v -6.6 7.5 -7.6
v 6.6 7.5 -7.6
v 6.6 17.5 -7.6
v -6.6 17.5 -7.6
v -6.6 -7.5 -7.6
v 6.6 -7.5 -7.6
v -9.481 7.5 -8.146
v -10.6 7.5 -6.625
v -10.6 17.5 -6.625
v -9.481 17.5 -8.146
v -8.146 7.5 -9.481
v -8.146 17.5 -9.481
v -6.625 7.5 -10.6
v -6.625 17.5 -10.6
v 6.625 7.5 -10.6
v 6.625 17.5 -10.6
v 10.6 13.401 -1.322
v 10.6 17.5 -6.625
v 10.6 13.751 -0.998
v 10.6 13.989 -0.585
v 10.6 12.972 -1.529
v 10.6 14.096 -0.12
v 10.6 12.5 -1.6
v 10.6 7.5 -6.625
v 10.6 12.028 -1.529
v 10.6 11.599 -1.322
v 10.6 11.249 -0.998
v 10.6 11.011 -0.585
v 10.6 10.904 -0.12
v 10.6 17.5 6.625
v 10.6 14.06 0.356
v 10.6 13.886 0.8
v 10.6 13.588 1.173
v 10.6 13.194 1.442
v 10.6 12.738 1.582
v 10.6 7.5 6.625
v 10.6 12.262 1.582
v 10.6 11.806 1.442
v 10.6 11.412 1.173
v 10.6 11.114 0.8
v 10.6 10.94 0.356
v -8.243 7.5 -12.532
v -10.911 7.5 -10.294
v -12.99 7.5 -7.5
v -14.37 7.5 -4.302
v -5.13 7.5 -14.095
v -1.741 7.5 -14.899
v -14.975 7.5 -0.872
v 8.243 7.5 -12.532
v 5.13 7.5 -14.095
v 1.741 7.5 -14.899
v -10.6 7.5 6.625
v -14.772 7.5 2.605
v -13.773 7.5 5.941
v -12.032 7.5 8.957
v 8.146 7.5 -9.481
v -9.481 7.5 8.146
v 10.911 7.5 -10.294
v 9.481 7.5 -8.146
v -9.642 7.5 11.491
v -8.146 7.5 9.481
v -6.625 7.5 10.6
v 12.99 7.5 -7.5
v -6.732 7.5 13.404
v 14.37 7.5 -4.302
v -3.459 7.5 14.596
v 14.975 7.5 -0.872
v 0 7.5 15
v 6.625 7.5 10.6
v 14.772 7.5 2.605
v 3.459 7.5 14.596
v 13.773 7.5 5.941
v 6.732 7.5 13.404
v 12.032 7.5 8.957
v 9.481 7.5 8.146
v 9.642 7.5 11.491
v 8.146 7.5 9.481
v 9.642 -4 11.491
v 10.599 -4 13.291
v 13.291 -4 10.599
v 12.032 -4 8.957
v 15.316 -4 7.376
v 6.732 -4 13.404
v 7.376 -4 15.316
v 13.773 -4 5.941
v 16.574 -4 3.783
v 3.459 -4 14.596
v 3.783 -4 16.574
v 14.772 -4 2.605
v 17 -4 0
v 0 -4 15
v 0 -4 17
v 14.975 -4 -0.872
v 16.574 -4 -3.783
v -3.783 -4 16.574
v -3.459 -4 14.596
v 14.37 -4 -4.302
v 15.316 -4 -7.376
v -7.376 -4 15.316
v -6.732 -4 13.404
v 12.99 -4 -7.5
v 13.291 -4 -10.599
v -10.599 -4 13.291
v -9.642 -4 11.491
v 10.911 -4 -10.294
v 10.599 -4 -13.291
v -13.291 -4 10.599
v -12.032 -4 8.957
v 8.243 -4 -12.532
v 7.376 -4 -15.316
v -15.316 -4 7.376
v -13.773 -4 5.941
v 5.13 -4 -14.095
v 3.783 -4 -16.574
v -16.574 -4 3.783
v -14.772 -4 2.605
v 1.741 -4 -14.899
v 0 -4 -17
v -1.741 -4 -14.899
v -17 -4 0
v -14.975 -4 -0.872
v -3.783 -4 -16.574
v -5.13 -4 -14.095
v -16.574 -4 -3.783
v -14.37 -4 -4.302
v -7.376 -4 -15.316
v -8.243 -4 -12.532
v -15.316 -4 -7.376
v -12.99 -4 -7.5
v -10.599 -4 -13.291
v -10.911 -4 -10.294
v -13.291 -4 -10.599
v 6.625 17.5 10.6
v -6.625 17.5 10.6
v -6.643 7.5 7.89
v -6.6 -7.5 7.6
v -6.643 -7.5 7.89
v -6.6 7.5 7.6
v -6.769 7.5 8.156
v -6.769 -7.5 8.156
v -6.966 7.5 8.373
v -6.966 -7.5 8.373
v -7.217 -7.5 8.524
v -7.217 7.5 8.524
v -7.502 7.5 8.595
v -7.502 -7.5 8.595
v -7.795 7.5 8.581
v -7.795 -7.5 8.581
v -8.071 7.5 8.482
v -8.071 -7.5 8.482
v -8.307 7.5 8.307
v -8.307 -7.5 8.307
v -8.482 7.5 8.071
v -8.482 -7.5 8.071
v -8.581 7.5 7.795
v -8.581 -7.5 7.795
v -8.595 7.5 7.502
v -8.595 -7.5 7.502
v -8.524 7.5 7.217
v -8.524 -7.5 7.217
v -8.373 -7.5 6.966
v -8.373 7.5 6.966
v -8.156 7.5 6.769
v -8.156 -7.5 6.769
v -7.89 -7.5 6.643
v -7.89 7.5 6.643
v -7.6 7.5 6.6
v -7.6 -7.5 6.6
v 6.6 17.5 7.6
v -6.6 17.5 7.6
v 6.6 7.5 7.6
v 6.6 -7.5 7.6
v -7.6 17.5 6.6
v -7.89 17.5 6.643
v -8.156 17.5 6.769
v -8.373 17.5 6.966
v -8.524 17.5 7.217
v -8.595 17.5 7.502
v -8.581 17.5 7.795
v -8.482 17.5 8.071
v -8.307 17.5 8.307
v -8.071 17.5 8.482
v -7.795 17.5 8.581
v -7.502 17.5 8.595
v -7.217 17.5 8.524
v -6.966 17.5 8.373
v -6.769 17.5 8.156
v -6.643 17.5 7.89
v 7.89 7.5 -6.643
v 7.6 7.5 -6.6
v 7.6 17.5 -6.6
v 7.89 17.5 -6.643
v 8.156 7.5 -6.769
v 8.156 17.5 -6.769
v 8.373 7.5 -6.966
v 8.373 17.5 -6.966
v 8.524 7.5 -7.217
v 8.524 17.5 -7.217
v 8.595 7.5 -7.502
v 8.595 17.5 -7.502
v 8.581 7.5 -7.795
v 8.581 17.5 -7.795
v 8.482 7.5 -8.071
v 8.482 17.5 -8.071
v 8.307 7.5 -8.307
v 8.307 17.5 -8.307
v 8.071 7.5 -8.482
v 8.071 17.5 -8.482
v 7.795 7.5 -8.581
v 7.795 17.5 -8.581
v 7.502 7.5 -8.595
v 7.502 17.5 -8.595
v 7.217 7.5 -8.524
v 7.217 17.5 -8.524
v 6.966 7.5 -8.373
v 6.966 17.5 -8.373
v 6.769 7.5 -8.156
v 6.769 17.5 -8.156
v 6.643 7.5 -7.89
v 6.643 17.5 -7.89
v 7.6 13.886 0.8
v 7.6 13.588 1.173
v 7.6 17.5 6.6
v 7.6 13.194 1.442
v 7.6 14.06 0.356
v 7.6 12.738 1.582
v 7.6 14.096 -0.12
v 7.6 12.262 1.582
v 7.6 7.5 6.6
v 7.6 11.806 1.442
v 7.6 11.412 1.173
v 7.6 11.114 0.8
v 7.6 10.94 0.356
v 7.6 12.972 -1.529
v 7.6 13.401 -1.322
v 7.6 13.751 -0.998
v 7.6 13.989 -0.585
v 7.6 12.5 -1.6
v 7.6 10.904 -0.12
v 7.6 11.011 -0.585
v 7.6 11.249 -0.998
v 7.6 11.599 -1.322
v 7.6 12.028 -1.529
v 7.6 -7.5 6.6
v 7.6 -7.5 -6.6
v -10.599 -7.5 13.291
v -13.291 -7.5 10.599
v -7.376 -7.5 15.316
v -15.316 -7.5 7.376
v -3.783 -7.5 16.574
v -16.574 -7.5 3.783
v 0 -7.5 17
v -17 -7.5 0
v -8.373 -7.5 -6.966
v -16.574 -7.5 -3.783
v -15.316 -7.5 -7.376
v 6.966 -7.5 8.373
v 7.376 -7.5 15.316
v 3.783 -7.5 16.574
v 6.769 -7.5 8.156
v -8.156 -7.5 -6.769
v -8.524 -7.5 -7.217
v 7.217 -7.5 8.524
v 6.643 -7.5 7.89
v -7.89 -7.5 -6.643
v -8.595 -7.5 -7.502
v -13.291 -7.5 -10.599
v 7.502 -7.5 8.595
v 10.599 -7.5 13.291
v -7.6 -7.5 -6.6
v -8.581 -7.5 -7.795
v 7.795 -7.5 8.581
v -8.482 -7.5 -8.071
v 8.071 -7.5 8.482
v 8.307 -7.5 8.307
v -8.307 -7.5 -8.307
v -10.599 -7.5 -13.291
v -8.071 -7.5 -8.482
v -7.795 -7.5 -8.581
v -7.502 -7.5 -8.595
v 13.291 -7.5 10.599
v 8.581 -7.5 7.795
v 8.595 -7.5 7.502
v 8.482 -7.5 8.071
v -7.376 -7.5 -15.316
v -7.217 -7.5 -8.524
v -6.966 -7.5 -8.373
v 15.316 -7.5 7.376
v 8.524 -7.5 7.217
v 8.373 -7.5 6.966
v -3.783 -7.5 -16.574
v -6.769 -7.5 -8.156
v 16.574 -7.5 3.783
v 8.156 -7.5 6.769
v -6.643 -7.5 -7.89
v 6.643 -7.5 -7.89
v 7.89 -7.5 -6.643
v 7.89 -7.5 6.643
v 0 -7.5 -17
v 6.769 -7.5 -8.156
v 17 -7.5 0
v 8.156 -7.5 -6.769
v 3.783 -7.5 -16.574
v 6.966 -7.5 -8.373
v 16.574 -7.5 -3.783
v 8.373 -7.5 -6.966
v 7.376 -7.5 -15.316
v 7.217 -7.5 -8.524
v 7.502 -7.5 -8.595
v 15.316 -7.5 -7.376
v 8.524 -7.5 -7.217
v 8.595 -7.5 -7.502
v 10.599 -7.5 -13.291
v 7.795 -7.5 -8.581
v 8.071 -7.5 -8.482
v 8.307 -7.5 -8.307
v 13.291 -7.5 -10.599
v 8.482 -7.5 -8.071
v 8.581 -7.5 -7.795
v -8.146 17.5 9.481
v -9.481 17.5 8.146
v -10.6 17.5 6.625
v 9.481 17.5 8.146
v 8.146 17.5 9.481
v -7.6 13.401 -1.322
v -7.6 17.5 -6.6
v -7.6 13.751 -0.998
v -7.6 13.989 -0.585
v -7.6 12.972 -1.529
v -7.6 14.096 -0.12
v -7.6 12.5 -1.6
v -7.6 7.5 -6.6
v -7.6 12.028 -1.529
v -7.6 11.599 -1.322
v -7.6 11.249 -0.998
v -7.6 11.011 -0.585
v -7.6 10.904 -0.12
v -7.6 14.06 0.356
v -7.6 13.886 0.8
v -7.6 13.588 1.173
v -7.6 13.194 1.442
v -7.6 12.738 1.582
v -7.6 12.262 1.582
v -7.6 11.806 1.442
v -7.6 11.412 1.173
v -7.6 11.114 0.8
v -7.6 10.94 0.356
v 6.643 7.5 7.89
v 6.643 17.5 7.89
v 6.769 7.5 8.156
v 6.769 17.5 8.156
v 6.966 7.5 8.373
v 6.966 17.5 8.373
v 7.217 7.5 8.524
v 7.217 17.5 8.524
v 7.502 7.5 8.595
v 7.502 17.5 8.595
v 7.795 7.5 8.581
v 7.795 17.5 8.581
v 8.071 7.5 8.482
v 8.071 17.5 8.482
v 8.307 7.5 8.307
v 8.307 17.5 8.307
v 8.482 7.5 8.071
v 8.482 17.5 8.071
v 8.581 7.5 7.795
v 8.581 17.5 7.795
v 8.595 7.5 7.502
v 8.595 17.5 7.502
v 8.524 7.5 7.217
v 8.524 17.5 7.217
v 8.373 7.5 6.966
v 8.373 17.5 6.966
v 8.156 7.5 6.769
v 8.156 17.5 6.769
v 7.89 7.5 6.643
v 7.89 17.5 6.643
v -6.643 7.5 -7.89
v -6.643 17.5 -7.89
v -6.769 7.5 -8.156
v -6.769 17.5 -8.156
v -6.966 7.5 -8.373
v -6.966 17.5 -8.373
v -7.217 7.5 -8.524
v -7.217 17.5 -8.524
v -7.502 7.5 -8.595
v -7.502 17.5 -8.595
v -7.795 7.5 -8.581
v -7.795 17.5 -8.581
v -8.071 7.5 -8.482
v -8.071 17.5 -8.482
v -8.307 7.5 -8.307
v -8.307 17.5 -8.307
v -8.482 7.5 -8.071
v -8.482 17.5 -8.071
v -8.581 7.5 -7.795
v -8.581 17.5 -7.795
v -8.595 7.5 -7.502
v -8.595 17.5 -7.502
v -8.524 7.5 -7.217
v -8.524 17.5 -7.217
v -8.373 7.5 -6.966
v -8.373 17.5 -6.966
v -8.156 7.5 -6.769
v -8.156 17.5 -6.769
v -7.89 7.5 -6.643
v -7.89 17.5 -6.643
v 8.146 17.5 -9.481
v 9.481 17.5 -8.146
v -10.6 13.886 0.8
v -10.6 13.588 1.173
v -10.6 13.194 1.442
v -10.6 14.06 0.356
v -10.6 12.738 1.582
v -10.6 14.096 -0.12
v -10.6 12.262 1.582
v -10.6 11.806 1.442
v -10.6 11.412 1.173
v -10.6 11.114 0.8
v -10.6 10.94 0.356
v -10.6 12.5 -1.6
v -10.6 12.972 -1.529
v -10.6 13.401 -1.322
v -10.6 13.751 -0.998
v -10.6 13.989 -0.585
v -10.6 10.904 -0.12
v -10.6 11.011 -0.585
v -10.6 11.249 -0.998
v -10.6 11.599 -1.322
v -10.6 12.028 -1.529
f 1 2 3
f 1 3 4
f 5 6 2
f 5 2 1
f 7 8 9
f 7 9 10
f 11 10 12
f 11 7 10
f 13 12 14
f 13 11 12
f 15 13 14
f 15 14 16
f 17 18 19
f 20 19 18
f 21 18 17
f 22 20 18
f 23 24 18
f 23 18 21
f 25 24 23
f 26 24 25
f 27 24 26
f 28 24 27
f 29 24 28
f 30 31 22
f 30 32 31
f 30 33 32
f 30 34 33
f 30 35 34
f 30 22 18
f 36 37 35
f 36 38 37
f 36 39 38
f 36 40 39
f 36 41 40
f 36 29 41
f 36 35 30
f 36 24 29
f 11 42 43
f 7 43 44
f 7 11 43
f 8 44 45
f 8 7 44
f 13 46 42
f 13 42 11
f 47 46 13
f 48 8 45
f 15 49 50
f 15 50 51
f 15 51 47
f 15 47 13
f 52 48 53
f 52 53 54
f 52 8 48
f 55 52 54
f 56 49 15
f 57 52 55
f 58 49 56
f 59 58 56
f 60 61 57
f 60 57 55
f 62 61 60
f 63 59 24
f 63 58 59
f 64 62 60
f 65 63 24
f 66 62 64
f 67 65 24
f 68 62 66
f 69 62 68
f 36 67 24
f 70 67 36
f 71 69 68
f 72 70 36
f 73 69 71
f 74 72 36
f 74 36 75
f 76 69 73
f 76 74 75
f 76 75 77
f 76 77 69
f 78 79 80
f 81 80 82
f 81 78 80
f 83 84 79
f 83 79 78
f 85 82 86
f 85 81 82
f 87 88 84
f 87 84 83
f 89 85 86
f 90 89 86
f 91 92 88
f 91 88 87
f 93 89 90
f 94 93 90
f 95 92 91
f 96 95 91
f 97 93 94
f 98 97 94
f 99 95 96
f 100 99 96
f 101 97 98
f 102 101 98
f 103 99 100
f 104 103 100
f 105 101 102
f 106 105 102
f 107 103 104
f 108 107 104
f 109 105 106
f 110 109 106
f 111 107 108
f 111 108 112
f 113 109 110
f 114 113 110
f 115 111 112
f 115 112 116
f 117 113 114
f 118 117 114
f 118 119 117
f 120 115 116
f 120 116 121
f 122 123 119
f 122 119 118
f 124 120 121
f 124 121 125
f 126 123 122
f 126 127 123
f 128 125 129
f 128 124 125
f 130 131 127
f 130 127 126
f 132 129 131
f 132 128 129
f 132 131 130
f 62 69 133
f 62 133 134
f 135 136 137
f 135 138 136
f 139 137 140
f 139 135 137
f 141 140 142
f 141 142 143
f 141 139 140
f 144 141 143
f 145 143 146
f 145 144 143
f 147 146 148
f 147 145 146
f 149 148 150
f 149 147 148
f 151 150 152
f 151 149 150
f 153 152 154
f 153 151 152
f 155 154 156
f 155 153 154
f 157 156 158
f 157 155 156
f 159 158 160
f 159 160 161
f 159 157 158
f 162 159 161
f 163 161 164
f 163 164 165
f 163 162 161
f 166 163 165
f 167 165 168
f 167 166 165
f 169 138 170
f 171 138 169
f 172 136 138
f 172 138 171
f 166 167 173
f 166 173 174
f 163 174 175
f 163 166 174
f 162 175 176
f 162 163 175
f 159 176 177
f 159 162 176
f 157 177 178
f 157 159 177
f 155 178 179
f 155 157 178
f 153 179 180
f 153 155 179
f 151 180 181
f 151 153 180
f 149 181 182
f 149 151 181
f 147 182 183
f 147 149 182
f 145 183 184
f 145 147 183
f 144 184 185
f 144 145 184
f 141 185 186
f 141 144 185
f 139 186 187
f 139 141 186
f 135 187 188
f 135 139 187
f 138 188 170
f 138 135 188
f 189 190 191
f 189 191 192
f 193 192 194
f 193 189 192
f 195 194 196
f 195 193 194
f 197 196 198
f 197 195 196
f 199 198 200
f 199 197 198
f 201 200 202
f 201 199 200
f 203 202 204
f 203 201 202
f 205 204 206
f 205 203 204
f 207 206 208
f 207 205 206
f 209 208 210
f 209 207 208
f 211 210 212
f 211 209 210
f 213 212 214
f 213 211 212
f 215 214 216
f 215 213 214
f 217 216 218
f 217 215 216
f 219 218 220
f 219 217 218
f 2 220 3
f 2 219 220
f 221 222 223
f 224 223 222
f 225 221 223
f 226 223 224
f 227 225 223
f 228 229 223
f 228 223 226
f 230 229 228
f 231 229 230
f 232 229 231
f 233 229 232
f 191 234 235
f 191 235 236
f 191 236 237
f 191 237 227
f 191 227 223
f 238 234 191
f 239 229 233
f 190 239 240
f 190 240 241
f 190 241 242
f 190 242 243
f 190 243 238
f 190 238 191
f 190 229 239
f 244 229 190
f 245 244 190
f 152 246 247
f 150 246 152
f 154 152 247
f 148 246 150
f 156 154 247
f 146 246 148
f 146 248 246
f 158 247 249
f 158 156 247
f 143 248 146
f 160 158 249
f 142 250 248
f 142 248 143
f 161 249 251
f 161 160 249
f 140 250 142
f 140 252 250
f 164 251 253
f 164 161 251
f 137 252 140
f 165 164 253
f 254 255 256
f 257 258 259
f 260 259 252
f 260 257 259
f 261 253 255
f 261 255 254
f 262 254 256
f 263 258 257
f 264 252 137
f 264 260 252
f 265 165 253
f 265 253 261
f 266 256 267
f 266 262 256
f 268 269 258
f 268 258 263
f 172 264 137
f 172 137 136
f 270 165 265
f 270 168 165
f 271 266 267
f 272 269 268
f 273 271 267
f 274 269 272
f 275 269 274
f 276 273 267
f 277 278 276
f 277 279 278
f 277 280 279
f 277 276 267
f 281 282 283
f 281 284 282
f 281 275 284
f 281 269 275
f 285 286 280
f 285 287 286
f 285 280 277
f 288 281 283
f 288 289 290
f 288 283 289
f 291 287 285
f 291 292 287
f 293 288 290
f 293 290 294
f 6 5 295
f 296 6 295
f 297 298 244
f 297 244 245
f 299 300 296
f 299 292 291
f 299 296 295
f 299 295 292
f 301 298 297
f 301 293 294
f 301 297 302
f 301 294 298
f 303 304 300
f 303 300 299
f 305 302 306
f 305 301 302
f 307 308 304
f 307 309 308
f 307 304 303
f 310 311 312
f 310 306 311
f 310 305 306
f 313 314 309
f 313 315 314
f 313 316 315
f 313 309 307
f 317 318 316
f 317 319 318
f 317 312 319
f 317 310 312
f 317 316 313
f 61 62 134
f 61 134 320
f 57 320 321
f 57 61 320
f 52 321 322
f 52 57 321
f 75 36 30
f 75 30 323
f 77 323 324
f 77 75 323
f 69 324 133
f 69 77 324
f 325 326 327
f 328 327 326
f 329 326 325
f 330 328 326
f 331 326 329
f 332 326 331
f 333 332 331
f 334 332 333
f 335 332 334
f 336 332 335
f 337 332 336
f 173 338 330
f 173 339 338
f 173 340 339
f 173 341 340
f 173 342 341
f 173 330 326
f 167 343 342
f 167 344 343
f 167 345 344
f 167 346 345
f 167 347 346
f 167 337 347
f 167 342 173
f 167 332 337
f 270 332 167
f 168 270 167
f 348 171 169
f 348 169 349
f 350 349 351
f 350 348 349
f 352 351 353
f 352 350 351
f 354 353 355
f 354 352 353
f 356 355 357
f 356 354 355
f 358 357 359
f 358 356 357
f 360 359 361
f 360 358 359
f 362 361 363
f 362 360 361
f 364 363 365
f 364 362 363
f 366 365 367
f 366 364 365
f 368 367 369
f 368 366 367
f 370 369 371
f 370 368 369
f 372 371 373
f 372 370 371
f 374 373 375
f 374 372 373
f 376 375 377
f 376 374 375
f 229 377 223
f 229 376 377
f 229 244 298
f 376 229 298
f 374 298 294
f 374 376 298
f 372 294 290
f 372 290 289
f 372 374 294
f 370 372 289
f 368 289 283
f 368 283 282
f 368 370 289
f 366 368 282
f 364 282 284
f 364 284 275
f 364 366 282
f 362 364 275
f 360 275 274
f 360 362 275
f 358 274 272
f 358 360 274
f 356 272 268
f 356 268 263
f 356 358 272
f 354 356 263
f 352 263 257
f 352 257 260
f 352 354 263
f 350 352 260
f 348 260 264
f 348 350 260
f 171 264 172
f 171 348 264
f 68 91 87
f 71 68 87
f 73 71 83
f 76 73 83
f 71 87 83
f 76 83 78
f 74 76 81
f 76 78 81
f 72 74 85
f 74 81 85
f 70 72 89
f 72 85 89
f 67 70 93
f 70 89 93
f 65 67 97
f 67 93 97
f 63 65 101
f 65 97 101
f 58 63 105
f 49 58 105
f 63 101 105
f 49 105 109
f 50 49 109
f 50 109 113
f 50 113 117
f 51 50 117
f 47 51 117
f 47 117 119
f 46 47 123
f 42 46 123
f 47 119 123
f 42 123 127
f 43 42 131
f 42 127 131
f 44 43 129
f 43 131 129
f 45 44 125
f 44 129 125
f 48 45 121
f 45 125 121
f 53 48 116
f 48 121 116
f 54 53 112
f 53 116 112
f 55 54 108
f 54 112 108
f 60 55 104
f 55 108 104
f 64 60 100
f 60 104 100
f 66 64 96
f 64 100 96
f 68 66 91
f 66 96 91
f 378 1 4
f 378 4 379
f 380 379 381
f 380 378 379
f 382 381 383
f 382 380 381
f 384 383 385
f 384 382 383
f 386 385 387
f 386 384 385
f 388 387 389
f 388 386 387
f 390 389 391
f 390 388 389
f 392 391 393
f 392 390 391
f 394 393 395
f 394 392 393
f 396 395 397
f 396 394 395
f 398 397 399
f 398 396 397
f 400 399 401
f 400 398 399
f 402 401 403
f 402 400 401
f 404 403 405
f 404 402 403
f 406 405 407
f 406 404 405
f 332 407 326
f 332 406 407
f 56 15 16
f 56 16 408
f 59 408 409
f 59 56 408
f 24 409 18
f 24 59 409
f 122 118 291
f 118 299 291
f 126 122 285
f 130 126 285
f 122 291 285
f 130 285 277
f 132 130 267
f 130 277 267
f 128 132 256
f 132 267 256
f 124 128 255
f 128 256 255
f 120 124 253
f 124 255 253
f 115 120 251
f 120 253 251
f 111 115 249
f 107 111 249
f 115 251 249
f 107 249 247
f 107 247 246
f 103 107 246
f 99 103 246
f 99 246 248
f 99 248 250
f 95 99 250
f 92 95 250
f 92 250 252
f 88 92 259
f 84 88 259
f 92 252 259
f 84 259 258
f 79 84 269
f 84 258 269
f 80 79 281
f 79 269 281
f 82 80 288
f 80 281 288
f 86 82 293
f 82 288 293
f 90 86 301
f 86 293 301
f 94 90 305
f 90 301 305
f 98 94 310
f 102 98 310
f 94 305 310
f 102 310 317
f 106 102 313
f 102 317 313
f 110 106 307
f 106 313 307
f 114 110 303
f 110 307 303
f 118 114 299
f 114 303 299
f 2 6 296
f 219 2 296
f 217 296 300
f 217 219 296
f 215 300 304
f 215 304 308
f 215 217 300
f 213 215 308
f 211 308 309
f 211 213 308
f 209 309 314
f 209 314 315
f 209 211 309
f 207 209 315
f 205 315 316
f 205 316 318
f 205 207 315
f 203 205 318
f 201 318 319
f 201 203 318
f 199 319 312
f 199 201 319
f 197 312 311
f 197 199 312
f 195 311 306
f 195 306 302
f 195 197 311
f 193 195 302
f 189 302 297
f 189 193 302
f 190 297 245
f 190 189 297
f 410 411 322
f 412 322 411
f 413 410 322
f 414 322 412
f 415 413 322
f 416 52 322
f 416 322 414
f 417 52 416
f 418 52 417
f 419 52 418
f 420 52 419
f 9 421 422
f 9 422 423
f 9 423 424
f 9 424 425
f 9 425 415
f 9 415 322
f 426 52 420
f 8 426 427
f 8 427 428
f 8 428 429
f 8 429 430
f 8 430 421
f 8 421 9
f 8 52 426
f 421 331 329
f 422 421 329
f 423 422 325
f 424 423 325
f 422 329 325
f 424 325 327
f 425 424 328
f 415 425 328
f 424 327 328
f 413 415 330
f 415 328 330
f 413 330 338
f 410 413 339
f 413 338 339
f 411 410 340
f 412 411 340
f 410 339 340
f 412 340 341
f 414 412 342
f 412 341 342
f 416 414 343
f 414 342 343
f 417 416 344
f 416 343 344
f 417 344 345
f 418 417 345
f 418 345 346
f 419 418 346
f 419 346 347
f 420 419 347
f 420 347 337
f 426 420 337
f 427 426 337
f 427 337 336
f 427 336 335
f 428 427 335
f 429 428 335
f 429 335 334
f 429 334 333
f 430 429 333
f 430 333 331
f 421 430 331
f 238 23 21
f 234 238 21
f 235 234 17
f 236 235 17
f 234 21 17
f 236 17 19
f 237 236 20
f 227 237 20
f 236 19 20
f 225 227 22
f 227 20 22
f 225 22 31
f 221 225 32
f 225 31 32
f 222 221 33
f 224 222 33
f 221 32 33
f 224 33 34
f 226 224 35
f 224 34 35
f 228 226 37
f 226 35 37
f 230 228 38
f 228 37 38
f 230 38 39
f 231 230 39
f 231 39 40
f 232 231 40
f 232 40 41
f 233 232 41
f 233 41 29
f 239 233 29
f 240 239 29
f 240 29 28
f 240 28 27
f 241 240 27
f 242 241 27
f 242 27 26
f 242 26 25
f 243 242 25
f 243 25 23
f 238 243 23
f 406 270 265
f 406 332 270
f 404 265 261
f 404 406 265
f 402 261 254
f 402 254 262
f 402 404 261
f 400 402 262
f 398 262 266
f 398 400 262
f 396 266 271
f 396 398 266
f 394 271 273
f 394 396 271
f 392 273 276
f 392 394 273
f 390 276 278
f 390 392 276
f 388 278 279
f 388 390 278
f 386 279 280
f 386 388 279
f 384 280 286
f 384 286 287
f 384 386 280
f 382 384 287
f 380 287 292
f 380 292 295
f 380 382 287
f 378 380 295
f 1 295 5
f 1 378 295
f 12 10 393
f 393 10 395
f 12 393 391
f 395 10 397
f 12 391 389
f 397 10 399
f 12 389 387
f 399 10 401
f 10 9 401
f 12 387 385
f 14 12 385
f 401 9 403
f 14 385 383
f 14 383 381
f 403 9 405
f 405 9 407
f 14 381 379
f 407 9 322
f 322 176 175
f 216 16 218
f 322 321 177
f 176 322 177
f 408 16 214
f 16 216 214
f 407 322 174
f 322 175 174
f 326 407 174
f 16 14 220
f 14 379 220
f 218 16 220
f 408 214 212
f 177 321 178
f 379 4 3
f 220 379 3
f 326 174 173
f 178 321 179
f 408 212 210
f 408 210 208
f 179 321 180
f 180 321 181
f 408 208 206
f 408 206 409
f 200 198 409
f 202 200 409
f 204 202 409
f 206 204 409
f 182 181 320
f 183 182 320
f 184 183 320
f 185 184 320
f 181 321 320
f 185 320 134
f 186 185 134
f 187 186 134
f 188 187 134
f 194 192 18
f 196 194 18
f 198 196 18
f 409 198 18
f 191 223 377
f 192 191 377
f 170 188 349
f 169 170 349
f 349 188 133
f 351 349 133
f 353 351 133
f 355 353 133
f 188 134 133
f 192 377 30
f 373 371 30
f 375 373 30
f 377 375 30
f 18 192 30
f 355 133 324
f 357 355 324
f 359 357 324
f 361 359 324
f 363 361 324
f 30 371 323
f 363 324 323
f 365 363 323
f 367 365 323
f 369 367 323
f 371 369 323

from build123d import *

# Parameters (mm, degrees)
SKETCH_1_R          = 12.5
EXTRUDE_1_DEPTH     = 7.5
EXTRUDE_2_DEPTH     = 10
EXTRUDE_START       = -3
SKETCH_3_R          = 17
SKETCH_3_R_2        = 12.5
EXTRUDE_3_DEPTH     = 3
SKETCH_4_R          = 2.1000000000000005
CUT_EXTRUDE_1_DEPTH = 37.83761664386012
SKETCH_5_R          = 1.6000000000000003
CUT_EXTRUDE_2_DEPTH = 37.83761664386012
CUT_EXTRUDE_START   = -10
CUT_EXTRUDE_3_DEPTH = 10
SKETCH_7_R          = 17
SKETCH_7_R_2        = 12.500000000000004
EXTRUDE_4_DEPTH     = 0.5
SKETCH_8_R          = 15
SKETCH_8_R_2        = 12.499999999999996
EXTRUDE_5_DEPTH     = 11.5


# Read off the part's stored shape, not the designer's step: 凸台-拉伸2
with BuildPart() as part:
    # 草图1 → 凸台-拉伸1 (new, symmetric)
    with BuildSketch(Plane(origin=(0, 0, 0), x_dir=(1, 0, 0), z_dir=(0, 1, 0))):
        with Locations(Location((-1.39e-15, 1.39e-15, 0), (0, 0, 270))):
            Circle(SKETCH_1_R)
        with BuildLine():
            Line((6.600000000000003, -7.6000000000000005), (-6.599999999999996, -7.6000000000000005))
            ThreePointArc((-6.599999999999996, -7.6000000000000005), (-8.30710678118655, -8.307106781186542), (-7.599999999999978, -6.6000000000000005))
            Line((-7.599999999999996, -6.6000000000000005), (-7.599999999999996, 6.599999999999999))
            ThreePointArc((-7.599999999999978, 6.599999999999999), (-8.30710678118655, 8.30710678118654), (-6.599999999999996, 7.599999999999999))
            Line((-6.599999999999996, 7.599999999999999), (6.600000000000003, 7.599999999999999))
            ThreePointArc((6.600000000000002, 7.599999999999999), (7.600000000000003, 8.6), (8.600000000000005, 7.599999999999999))
            ThreePointArc((8.600000000000005, 7.599999999999999), (8.307106781186558, 6.892893218813457), (7.600000000000021, 6.599999999999998))
            Line((7.600000000000003, 6.599999999999999), (7.600000000000003, -6.6))
            ThreePointArc((7.600000000000021, -6.6), (8.307106781186558, -6.892893218813459), (8.600000000000003, -7.6000000000000005))
            ThreePointArc((8.600000000000003, -7.6000000000000005), (7.600000000000003, -8.600000000000001), (6.600000000000002, -7.6000000000000005))
        make_face(mode=Mode.SUBTRACT)
    extrude(amount=EXTRUDE_1_DEPTH, both=True)

    # 凸台-拉伸2 outline → 凸台-拉伸2 (add)
    with BuildSketch(Plane.XZ.offset(7.5)):
        with BuildLine():
            Line((10.6, -6.62495283), (10.6, 6.62495283))
            ThreePointArc((10.6, 6.62495283), (8.838834765, 8.838834765), (6.62495283, 10.6))
            Line((6.62495283, 10.6), (-6.62495283, 10.6))
            ThreePointArc((-6.62495283, 10.6), (-8.838834765, 8.838834765), (-10.6, 6.62495283))
            Line((-10.6, 6.62495283), (-10.6, -6.62495283))
            ThreePointArc((-10.6, -6.62495283), (-8.838834765, -8.838834765), (-6.62495283, -10.6))
            Line((-6.62495283, -10.6), (6.62495283, -10.6))
            ThreePointArc((6.62495283, -10.6), (8.838834765, -8.838834765), (10.6, -6.62495283))
        make_face()
        with BuildLine():
            ThreePointArc((-6.6, -7.6), (-8.307106781, -8.307106781), (-7.6, -6.6))
            Line((-7.6, -6.6), (-7.6, 6.6))
            ThreePointArc((-7.6, 6.6), (-8.307106781, 8.307106781), (-6.6, 7.6))
            Line((-6.6, 7.6), (6.6, 7.6))
            ThreePointArc((6.6, 7.6), (8.307106781, 8.307106781), (7.6, 6.6))
            Line((7.6, 6.6), (7.6, -6.6))
            ThreePointArc((7.6, -6.6), (8.307106781, -8.307106781), (6.6, -7.6))
            Line((6.6, -7.6), (-6.6, -7.6))
        make_face(mode=Mode.SUBTRACT)
    extrude_2 = extrude(amount=EXTRUDE_2_DEPTH)

    # 镜向1: 凸台-拉伸2 across plane
    add(extrude_2.mirror(Plane.ZX))

    # 草图3 → 凸台-拉伸3 (add)
    with BuildSketch(Plane.XZ.offset(7.5).offset(EXTRUDE_START)):
        with Locations(Location((0, 0, 0), (0, 0, 270))):
            Circle(SKETCH_3_R)
        with Locations(Location((0, 0, 0), (0, 0, 270))):
            Circle(SKETCH_3_R_2, mode=Mode.SUBTRACT)
    extrude(amount=EXTRUDE_3_DEPTH)

    # 草图4 → 切除-拉伸1 (cut, through all)
    with BuildSketch(Plane.XY.offset(10.600000000000001)):
        with Locations((-8.7e-16, -12.5)):
            Circle(SKETCH_4_R)
    extrude(amount=-CUT_EXTRUDE_1_DEPTH, mode=Mode.SUBTRACT)

    # 草图5 → 切除-拉伸2 (cut, through all)
    with BuildSketch(Plane(origin=(10.6, 0, 0), x_dir=(0, 0, -1), z_dir=(1, 0, 0))):
        with Locations((1.73e-15, 12.5)):
            Circle(SKETCH_5_R)
    extrude(amount=-CUT_EXTRUDE_2_DEPTH, mode=Mode.SUBTRACT)

    # 草图6 → 切除-拉伸3 (cut)
    with BuildSketch(Plane.XZ.offset(17.5).offset(CUT_EXTRUDE_START)):
        with BuildLine():
            Line((10.599999999999996, -6.624952830020757), (10.6, 6.624952830020752))
            ThreePointArc((10.6, 6.624952830020752), (8.83883476483184, 8.838834764831846), (6.6249528300207485, 10.600000000000001))
            Line((6.6249528300207485, 10.600000000000001), (-6.624952830020753, 10.600000000000001))
            ThreePointArc((-6.624952830020753, 10.600000000000001), (-8.838834764831846, 8.838834764831844), (-10.6, 6.624952830020758))
            Line((-10.6, 6.624952830020758), (-10.6, -6.624952830020761))
            ThreePointArc((-10.6, -6.624952830020761), (-8.83883476483185, -8.838834764831843), (-6.624952830020767, -10.599999999999994))
            Line((-6.624952830020767, -10.599999999999994), (6.624952830020759, -10.599999999999998))
            ThreePointArc((6.624952830020759, -10.599999999999998), (8.838834764831844, -8.838834764831844), (10.599999999999996, -6.624952830020757))
        make_face()
    extrude(amount=CUT_EXTRUDE_3_DEPTH, mode=Mode.SUBTRACT)

    # 草图7 → 凸台-拉伸4 (add)
    with BuildSketch(Plane(origin=(0, -4.5, 0), x_dir=(1, 0, 0), z_dir=(0, 1, 0))):
        with Locations(Location((0, 0, 0), (0, 0, 90))):
            Circle(SKETCH_7_R)
        with Locations(Location((0, 0, 0), (0, 0, 122.005199861))):
            Circle(SKETCH_7_R_2, mode=Mode.SUBTRACT)
    extrude(amount=EXTRUDE_4_DEPTH)

    # 草图8 → 凸台-拉伸5 (add)
    with BuildSketch(Plane(origin=(0, -4, 0), x_dir=(1, 0, 0), z_dir=(0, 1, 0))):
        with Locations(Location((0, 0, 0), (0, 0, 270))):
            Circle(SKETCH_8_R)
        Circle(SKETCH_8_R_2, mode=Mode.SUBTRACT)
    extrude(amount=EXTRUDE_5_DEPTH)


solid = part.part
